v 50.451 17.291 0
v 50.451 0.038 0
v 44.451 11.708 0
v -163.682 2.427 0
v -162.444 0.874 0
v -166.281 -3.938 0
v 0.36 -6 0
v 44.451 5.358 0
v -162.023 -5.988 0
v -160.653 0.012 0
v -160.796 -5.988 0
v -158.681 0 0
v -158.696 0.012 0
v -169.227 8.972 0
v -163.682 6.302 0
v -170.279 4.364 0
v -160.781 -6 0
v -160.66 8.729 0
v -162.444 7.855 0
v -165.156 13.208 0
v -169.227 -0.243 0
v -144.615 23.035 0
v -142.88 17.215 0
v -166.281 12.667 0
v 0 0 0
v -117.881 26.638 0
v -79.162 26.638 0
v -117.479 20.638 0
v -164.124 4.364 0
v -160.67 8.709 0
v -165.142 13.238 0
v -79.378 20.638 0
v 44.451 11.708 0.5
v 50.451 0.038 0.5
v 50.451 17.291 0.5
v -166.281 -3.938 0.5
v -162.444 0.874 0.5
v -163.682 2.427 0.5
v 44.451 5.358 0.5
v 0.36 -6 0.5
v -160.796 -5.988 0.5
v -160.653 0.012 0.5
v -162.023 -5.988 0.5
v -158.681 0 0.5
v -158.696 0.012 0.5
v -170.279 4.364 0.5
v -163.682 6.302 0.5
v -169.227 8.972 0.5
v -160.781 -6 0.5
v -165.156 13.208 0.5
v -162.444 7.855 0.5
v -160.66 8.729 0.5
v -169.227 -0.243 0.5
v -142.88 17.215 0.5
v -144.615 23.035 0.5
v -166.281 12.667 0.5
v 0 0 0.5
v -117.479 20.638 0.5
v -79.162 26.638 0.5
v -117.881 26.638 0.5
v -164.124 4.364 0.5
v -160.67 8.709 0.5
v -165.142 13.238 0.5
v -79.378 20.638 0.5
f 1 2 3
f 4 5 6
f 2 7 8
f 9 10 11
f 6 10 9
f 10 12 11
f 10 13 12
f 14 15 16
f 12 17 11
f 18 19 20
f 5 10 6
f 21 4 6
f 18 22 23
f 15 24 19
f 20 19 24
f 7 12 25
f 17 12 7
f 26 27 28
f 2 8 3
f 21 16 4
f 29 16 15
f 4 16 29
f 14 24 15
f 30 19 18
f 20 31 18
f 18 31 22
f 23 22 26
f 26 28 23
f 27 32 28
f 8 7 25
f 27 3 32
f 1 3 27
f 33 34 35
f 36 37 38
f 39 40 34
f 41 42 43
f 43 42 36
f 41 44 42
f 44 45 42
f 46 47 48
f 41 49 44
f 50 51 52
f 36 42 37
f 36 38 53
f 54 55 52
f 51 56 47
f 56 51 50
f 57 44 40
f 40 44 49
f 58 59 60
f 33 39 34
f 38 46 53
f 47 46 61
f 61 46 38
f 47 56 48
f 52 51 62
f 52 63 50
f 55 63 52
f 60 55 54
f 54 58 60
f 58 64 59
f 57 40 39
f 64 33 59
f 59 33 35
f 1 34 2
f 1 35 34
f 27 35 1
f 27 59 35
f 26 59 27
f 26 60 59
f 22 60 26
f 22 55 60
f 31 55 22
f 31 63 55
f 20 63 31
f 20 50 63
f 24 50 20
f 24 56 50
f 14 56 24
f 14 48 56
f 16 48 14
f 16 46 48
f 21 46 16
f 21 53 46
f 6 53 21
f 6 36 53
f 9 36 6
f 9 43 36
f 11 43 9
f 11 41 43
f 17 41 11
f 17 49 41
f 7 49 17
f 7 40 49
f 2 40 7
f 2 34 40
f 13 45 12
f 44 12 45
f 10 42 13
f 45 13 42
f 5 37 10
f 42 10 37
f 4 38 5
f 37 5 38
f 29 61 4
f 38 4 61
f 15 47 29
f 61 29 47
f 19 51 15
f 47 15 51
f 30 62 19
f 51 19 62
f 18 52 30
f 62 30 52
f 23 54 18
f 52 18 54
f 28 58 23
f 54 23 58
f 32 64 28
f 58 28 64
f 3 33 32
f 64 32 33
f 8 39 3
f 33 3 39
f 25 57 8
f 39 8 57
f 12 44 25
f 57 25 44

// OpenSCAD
// Type of object: outline or inner template
mode = "outline"; // [outline, inside]
// Z-height of the generated part (mm)
thickness = 0.5;
// Width of reinforcement band (mm, outline mode)
width = 6;

/* [Hidden] */
if (mode == "inside")
  goblin_wing_template(thickness);
else
  goblin_wing_reinforce(thickness, width);

module goblin_wing_reinforce(thick, wide) {
  linear_extrude(thick) difference() {
    // cut the top and botton to fit in existing space
    intersection() {
      offset(delta=wide) wingshape();
      translate([-500/2, -14, 0]) square([500, 41.5]);
    }
    wingshape();
  }
}

module goblin_wing_template(thick) {
  linear_extrude(thick) wingshape();
}

module wingshape() {
  /* From FT official free plans, imported into Inkscape and path values copied 
     https://www.flitetest.com/articles/ft-goblin-release 
  */
  p=[
[222.899,115.137],
[267.350,120.495],
[267.350,126.845],
[143.521,135.775],
[105.420,135.775],
[80.019,132.352],
[62.239,123.866],
[59.742,118.711],
[64.218,115.137]
  ];
  translate(-p[0]) {
  polygon(p);
  translate([p[6][0]+1.0,(p[6][1]+p[8][1])/2,0])
    circle((p[6][1]-p[8][1])/2+0.1, $fn=14);
  }
}
